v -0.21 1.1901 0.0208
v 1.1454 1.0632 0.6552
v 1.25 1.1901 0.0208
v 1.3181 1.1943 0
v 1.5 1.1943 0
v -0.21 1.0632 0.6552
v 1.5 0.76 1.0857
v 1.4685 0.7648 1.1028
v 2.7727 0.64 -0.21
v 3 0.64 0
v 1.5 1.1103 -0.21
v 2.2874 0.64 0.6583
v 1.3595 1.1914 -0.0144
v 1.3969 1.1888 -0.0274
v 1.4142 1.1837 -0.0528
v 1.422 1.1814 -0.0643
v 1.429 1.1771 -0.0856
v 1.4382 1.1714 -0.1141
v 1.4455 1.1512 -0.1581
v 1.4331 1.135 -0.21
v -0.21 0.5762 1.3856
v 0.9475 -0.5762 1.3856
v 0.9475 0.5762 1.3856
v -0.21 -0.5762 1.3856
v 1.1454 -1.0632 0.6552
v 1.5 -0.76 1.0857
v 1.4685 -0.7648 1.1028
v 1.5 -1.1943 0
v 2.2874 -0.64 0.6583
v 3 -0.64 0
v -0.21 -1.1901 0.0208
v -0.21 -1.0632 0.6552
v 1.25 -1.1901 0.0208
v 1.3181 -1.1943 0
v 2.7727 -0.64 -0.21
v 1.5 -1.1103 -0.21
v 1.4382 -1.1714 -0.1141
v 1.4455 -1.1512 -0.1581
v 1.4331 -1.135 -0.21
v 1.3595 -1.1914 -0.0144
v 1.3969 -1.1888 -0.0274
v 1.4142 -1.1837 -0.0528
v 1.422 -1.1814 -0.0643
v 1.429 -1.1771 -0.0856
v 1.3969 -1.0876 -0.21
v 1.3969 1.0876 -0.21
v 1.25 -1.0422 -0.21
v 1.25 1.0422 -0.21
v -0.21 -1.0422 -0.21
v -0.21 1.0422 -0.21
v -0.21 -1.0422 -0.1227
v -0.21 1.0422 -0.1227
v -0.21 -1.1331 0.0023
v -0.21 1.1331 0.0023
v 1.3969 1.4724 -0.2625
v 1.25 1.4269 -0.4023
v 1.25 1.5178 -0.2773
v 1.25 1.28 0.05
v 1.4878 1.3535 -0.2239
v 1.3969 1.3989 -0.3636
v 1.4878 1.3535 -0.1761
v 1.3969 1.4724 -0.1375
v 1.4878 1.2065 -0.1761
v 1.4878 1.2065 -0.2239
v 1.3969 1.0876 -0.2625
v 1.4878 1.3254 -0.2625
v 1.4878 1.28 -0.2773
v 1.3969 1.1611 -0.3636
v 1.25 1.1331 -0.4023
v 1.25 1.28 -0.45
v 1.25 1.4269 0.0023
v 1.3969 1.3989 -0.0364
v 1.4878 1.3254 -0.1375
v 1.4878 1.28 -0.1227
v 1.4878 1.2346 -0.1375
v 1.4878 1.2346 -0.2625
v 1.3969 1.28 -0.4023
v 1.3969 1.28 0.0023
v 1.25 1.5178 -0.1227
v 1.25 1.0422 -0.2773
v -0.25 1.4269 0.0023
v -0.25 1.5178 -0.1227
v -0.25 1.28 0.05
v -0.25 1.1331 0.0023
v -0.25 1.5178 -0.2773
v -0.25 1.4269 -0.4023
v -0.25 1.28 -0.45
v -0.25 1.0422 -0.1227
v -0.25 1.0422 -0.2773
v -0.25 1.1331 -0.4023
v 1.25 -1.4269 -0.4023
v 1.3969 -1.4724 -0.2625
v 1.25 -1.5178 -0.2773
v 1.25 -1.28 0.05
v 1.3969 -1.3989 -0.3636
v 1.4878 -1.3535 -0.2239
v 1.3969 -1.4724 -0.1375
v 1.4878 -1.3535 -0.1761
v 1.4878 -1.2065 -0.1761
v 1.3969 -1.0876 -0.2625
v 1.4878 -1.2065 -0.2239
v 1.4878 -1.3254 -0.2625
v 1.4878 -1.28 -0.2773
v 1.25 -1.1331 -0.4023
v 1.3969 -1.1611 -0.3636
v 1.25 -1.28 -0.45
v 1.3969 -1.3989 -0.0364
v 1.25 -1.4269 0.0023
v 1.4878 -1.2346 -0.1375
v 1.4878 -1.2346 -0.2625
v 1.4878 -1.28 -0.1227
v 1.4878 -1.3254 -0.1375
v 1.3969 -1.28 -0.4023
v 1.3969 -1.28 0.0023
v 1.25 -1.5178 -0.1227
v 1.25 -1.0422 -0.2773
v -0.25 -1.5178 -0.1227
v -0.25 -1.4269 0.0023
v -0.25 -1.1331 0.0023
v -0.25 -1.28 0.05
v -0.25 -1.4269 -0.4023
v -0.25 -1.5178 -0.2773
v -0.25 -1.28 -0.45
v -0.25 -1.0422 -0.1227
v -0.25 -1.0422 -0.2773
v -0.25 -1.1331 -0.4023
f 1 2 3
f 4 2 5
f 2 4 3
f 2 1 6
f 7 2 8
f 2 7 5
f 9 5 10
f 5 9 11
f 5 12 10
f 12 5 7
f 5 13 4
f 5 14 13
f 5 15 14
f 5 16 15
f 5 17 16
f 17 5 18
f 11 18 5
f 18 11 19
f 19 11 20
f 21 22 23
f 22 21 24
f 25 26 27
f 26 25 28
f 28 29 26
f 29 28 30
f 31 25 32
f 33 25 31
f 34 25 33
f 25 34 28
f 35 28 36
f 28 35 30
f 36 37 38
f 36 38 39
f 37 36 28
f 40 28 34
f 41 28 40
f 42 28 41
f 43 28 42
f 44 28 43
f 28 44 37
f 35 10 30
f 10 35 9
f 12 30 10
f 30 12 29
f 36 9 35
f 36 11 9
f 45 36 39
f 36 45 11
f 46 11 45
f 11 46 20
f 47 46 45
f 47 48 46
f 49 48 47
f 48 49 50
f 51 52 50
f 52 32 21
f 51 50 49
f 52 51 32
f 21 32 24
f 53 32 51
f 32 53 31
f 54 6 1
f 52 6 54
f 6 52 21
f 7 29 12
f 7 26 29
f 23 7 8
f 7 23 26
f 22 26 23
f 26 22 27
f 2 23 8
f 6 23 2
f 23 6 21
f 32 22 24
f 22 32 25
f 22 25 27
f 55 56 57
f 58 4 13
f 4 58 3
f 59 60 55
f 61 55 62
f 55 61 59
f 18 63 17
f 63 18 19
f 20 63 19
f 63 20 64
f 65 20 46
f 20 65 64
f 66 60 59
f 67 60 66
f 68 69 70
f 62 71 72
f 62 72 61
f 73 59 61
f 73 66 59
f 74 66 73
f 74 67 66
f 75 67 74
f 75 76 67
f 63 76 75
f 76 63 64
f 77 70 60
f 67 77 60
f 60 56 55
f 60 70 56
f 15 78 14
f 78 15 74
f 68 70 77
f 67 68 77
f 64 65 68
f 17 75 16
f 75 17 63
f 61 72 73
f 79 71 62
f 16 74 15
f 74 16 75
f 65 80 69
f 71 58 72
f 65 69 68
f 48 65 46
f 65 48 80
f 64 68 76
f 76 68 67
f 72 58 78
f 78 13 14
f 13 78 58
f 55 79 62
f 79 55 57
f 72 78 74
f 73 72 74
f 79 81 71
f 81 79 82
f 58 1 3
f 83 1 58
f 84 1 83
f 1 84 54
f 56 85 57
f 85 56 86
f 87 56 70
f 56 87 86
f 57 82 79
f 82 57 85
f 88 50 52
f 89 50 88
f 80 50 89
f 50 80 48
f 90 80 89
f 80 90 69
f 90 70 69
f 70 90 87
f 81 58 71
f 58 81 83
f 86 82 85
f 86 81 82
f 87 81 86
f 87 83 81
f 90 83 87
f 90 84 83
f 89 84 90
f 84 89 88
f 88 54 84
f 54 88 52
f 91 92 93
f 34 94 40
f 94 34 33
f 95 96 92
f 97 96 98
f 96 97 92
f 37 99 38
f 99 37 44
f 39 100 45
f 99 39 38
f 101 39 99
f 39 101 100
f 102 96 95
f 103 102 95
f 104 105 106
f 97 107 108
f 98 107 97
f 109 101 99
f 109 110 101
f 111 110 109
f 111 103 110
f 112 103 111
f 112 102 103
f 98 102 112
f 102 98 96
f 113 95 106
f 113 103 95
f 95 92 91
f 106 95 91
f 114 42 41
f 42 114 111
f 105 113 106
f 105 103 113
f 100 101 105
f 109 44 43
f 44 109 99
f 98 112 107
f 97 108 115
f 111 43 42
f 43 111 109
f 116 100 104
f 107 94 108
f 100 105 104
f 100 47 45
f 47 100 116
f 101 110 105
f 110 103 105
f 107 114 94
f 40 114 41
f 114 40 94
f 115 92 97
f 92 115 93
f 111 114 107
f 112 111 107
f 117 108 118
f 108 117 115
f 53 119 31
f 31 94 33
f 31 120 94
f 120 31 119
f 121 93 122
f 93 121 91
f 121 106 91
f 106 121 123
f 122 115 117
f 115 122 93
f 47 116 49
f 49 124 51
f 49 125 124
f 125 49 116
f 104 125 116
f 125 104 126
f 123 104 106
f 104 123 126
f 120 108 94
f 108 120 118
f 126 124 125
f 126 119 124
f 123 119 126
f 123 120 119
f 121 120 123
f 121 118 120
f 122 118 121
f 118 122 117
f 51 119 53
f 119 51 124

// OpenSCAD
// file: common.scad
faces_convex=64;
faces_concave=128;
faces_rough=32;

disk_0_width=36;
disk_0_deck_h=2.5;
disk_0_upper_d=12;

disk_1_width=100;
disk_1_height=15;

class_0_nacelles_w=5;
class_0_nacelles_l=36;

class_0_secondary_w=10;
class_0_secondary_l=36;

class_0_hangar_l=50;

class_1_nacelle_w=9;
class_1_nacelle_l=115;

class_1_neck_w=10;
class_1_neck_w_2=1;

class_1_secondary_w=25;
class_1_secondary_l=100;

disk_2_width=240;
disk_2_height=30;
disk_2_deck=3;

class_2_nacelle_w=25;
class_2_nacelle_h=25;
class_2_nacelle_l=300;

class_2_secondary_w=60;
class_2_secondary_l=200;

disk_3_width=400;
disk_3_height=40;
disk_3_body_width=180;

disk_4_width=750;
disk_4_upper=525;
disk_4_height=50;

class_3_nacelle_w=80;
class_3_nacelle_h=30;
class_3_nacelle_l=400;

class_4_body_w=200;
class_4_body_curve=50;
class_4_body_upper_curve=10;
class_4_body_inner_curve=5;
class_4_body_wall=10;
class_4_body_height=135;
class_4_body_l=720;
class_4_body_hangar=100;

class_4_nacelle_sep=400;

class_4_hangar_h=90;
class_4_hangar_w=180;

class_4_nacelle_l=1100;
class_4_nacelle_w=100;
class_4_nacelle_h=100;
// file: smalls.scad
use <../lib/util.scad>;
use <disks.scad>;
use <engines.scad>;
include <common.scad>;

module shuttlepod_body() {
    intersection() {
        scale([3,.64,1.6]) {
            util_mirrored([0,1,0])
            translate([0,1,0])
            sphere(d=2, $fn=6);

            rotate([90,0,0])
            cylinder(d=2,h=2,$fn=6, center=true);
        }

        translate([2-.01-.2, 0, 2-.01-.2])
        cube(4, center=true);
       
        
        scale([7,1,3.8])
        rotate([90,0,0])
        cylinder(d=1, h=4, $fn=4, center=true);
        
        scale([7,3,4.5])
        rotate([0,90,0])
        cylinder(d=1, h=4, $fn=4, center=true);    
    }
}

module shuttlepod_nacelle() {
    rotate([0,90,0]) {
        translate([0,0,.75])
        sphere(d=.5, $fn=10);

        cylinder(d=.5, h=1.5, center=true, $fn=10);
    }
}
// file: ../lib/util.scad
fn1 = 32;
fn2 = 16;

module util_half_sphere(radius, fn=fn1) {
    difference() {
        sphere(radius, $fn=fn);
        translate([0,0,-(radius+radius/19)])
            cube(2*radius+radius/10, center=true);
    }
}

function gcd(a,b) = a == b ? a : a > b ? gcd(a-b, b) : gcd(a, b-a);

module util_saucer(length, width, height, fn=fn1) {
    rad = gcd(length,gcd(width,height));
    //rad = 10;
    scale([length/(2*rad), width/(2*rad), height/rad])
        util_half_sphere(rad, fn);
}

module util_half_cylinder(length, radius, inner_fn=fn2, outer_fn=fn1) {
    maxval = max(length, 2*radius);
    intersection() {
        difference() {
            rotate([0,90,0])
                translate([0,0,-(length/2 + length/20)])
                    cylinder(length+length/10, radius, radius, $fn=inner_fn);
            
            translate([0,0,(maxval/2 + maxval/19)])
                cube(maxval+maxval/10, center=true);
        }
        
        translate([0,0,-(radius+radius/20)])
            cylinder(radius + radius/10, length/2, length/2, $fn=outer_fn);
    }
}

module util_body(length, width, height, upper_height, fn=fn1) {
    rad = gcd(length, gcd(width, upper_height));
    
    scale(.995) scale([length/(2*rad), width/(2*rad), 1])
        util_half_cylinder(2*rad, height, outer_fn=fn);
}

module util_graded_cylinder(height, radius_start, radius_end, grades=1, fn=fn1) {
    height_grade = height / grades;
    radius_grade = (radius_start - radius_end) / (grades * grades);
    for (i = [0 : 1 : grades]) {
        translate([0,0,i*height_grade])
            cylinder(height_grade, 
                     radius_start - i*radius_grade * i,
                     radius_start - (i+1) * radius_grade * (i+1),
                     $fn = fn);
    }
}

module util_nacelle(length, width, height, curved=false, up=true, front_bulge=false) {
    rad = min(width, height/2);
    grads = curved ? 6 : 1;
    scale_factor = front_bulge ? 1.1 : 1;
    direction = up ? -1 : 1;
    difference() {
        scale([1, width/ (2*rad), height/rad])
            difference() {
                union() {
                    rotate([0,-90,0])
                        rotate(30)
                            util_graded_cylinder(length-rad, rad, rad/2, grads, 6);
                    scale(scale_factor) 
                        rotate([0,90,0]) rotate(90) sphere(rad, $fn=6);
                }
                
                translate([-length/2, 0, direction * (height/2 + height/19)])
                    cube([length+length, width+width, height+height/10], center=true);
            }
        
        translate([-length-(curved?length/3:0), 0, -length/3])
            rotate([0,-45,0])
                cube(length, center=true);
    }
}

module util_mirrored(v) {
    children();
    mirror(v) children();
}

module util_ring(outer, inner, height, fn=fn1) {
    difference() {
        translate([0,0,-height/2])
            cylinder(height, outer, outer, $fn=fn);
        translate([0,0,-(height/2 + height/19)])
            cylinder(height+height/10, inner, inner, $fn=fn);
    }
}

module util_star(radius, thick, num, half=false) {
    angle = 360/num;
    offset = half? angle/2 : 0;
    for (i = [0: 1: num]) {
        rotate(i* angle + offset)
            translate([radius/2,0,0])
                cube([radius, thick, thick], center=true);
    }
}

module util_ring_star(radius, thick, num, inner, half=false) {
    outer=inner+thick;
    avg = (inner + outer)/2;
    union() {
        difference() {
            util_star(radius, thick, num, half);
            cylinder(2*thick, outer, outer, $fn=num, center=true);
        }
        util_ring(outer, inner, thick);
    }
}

module util_hangar_disk(height, lower, upper, num, fn=fn1) {
    difference() {
            cylinder(height, lower, upper, $fn=fn, center=true);
        difference() {
            scale([1,1,22])
                util_star(1.1*upper, height/20, num, half=true);
            scale(.95)
                cylinder(height, lower, upper, $fn=fn, center=true);
        }
    }
}

module util_hangar_form(length, width, height, num, inner=0) {
    l = 0.6* max(length, width);
    h = 2.5* height;
    thick = min(height/20,1);
    inner = inner == 0 ? l/3 : inner;
    difference() {
        children();
        scale([1,1,h/thick]) 
            util_ring_star(l, thick, num, inner, half=true);
    }
    scale(.95) children();
}

module util_nacelle_bar(span, height, width, thickness, faces=fn1) {
    rad = (span*span/(8*height) + height/2);
    outer = rad + thickness/2;
    inner = rad - thickness/2;
    difference(){
        translate([0,0,outer])
            rotate([0,90,0])
                util_ring(outer, inner, width, fn=faces);
    
        translate([0,0,1.1*outer+height])
            cube(2.2*outer, center=true);
    }
}

module util_q_sphere(rad, quadrant, faces) {
    x_sign = quadrant == 1 ? 1 :
             quadrant == 2 ? -1 :
             quadrant == 3 ? -1 :
             quadrant == 4 ? 1 : 0;
    z_sign = quadrant == 1 ? 1 :
             quadrant == 2 ? 1 :
             quadrant == 3 ? -1 :
             quadrant == 4 ? -1 : 0;
    
    difference() {
        sphere(rad, $fn=faces);

        translate([x_sign*(-1.1*rad - .01),0,0])
        cube(2.2*rad, center=true);

        translate([0,0,z_sign*(-1.1*rad - .01)])
        cube(2.2*rad, center=true);
    }
}

module util_ovoid(front_rad, back_rad, width, upper_rad, lower_rad, faces=32) {
    half_width = width/2;
    largest=max(front_rad, back_rad, half_width, upper_rad, lower_rad);
    smallest=min(front_rad, back_rad, half_width, upper_rad, lower_rad);
    
    union() {
        scale([front_rad/smallest, half_width/smallest, upper_rad/smallest])
        util_q_sphere(smallest, 1, faces);
        
        scale([front_rad/smallest, half_width/smallest, lower_rad/smallest])
        util_q_sphere(smallest, 4, faces);
        
        scale([back_rad/smallest, half_width/smallest, lower_rad/smallest])
        util_q_sphere(smallest, 3, faces);
        
        scale([back_rad/smallest, half_width/smallest, upper_rad/smallest])
        util_q_sphere(smallest, 2, faces);
    }
}

module util_saucer_shape(width, height, height_ext, depth, depth_ext) {
    difference() {
        util_ovoid(width/2,
                   width/2,
                   width,
                   height+height_ext,
                   depth+depth_ext);
        
        if (height_ext > 0) {
            translate([0,0,width/2 + height])
            cube(width, center=true);
        }
        
        if (depth_ext > 0) {
            translate([0,0,-width/2 - depth])
            cube(width, center=true);
        }
    }
}

module util_repeat(times, vector) {
    x = vector[0];
    y = vector[1];
    z = vector[2];
    for(i=[0:times]) {
        translate([i*x, i*y, i*z])
        children();
    }
}

module util_repeat_rot(times, rot_vector) {
    x = rot_vector[0];
    y = rot_vector[1];
    z = rot_vector[2];
    for(i=[0:times]) {
        rotate([i*x, i*y, i*z])
        children();
    }
}
// main file
use <../lib/util.scad>;
use <smalls.scad>;

module shuttlepod() {
    shuttlepod_body();

    util_mirrored([0,1,0])
    translate([.5,1.28,-.2]) shuttlepod_nacelle();
}

shuttlepod();
